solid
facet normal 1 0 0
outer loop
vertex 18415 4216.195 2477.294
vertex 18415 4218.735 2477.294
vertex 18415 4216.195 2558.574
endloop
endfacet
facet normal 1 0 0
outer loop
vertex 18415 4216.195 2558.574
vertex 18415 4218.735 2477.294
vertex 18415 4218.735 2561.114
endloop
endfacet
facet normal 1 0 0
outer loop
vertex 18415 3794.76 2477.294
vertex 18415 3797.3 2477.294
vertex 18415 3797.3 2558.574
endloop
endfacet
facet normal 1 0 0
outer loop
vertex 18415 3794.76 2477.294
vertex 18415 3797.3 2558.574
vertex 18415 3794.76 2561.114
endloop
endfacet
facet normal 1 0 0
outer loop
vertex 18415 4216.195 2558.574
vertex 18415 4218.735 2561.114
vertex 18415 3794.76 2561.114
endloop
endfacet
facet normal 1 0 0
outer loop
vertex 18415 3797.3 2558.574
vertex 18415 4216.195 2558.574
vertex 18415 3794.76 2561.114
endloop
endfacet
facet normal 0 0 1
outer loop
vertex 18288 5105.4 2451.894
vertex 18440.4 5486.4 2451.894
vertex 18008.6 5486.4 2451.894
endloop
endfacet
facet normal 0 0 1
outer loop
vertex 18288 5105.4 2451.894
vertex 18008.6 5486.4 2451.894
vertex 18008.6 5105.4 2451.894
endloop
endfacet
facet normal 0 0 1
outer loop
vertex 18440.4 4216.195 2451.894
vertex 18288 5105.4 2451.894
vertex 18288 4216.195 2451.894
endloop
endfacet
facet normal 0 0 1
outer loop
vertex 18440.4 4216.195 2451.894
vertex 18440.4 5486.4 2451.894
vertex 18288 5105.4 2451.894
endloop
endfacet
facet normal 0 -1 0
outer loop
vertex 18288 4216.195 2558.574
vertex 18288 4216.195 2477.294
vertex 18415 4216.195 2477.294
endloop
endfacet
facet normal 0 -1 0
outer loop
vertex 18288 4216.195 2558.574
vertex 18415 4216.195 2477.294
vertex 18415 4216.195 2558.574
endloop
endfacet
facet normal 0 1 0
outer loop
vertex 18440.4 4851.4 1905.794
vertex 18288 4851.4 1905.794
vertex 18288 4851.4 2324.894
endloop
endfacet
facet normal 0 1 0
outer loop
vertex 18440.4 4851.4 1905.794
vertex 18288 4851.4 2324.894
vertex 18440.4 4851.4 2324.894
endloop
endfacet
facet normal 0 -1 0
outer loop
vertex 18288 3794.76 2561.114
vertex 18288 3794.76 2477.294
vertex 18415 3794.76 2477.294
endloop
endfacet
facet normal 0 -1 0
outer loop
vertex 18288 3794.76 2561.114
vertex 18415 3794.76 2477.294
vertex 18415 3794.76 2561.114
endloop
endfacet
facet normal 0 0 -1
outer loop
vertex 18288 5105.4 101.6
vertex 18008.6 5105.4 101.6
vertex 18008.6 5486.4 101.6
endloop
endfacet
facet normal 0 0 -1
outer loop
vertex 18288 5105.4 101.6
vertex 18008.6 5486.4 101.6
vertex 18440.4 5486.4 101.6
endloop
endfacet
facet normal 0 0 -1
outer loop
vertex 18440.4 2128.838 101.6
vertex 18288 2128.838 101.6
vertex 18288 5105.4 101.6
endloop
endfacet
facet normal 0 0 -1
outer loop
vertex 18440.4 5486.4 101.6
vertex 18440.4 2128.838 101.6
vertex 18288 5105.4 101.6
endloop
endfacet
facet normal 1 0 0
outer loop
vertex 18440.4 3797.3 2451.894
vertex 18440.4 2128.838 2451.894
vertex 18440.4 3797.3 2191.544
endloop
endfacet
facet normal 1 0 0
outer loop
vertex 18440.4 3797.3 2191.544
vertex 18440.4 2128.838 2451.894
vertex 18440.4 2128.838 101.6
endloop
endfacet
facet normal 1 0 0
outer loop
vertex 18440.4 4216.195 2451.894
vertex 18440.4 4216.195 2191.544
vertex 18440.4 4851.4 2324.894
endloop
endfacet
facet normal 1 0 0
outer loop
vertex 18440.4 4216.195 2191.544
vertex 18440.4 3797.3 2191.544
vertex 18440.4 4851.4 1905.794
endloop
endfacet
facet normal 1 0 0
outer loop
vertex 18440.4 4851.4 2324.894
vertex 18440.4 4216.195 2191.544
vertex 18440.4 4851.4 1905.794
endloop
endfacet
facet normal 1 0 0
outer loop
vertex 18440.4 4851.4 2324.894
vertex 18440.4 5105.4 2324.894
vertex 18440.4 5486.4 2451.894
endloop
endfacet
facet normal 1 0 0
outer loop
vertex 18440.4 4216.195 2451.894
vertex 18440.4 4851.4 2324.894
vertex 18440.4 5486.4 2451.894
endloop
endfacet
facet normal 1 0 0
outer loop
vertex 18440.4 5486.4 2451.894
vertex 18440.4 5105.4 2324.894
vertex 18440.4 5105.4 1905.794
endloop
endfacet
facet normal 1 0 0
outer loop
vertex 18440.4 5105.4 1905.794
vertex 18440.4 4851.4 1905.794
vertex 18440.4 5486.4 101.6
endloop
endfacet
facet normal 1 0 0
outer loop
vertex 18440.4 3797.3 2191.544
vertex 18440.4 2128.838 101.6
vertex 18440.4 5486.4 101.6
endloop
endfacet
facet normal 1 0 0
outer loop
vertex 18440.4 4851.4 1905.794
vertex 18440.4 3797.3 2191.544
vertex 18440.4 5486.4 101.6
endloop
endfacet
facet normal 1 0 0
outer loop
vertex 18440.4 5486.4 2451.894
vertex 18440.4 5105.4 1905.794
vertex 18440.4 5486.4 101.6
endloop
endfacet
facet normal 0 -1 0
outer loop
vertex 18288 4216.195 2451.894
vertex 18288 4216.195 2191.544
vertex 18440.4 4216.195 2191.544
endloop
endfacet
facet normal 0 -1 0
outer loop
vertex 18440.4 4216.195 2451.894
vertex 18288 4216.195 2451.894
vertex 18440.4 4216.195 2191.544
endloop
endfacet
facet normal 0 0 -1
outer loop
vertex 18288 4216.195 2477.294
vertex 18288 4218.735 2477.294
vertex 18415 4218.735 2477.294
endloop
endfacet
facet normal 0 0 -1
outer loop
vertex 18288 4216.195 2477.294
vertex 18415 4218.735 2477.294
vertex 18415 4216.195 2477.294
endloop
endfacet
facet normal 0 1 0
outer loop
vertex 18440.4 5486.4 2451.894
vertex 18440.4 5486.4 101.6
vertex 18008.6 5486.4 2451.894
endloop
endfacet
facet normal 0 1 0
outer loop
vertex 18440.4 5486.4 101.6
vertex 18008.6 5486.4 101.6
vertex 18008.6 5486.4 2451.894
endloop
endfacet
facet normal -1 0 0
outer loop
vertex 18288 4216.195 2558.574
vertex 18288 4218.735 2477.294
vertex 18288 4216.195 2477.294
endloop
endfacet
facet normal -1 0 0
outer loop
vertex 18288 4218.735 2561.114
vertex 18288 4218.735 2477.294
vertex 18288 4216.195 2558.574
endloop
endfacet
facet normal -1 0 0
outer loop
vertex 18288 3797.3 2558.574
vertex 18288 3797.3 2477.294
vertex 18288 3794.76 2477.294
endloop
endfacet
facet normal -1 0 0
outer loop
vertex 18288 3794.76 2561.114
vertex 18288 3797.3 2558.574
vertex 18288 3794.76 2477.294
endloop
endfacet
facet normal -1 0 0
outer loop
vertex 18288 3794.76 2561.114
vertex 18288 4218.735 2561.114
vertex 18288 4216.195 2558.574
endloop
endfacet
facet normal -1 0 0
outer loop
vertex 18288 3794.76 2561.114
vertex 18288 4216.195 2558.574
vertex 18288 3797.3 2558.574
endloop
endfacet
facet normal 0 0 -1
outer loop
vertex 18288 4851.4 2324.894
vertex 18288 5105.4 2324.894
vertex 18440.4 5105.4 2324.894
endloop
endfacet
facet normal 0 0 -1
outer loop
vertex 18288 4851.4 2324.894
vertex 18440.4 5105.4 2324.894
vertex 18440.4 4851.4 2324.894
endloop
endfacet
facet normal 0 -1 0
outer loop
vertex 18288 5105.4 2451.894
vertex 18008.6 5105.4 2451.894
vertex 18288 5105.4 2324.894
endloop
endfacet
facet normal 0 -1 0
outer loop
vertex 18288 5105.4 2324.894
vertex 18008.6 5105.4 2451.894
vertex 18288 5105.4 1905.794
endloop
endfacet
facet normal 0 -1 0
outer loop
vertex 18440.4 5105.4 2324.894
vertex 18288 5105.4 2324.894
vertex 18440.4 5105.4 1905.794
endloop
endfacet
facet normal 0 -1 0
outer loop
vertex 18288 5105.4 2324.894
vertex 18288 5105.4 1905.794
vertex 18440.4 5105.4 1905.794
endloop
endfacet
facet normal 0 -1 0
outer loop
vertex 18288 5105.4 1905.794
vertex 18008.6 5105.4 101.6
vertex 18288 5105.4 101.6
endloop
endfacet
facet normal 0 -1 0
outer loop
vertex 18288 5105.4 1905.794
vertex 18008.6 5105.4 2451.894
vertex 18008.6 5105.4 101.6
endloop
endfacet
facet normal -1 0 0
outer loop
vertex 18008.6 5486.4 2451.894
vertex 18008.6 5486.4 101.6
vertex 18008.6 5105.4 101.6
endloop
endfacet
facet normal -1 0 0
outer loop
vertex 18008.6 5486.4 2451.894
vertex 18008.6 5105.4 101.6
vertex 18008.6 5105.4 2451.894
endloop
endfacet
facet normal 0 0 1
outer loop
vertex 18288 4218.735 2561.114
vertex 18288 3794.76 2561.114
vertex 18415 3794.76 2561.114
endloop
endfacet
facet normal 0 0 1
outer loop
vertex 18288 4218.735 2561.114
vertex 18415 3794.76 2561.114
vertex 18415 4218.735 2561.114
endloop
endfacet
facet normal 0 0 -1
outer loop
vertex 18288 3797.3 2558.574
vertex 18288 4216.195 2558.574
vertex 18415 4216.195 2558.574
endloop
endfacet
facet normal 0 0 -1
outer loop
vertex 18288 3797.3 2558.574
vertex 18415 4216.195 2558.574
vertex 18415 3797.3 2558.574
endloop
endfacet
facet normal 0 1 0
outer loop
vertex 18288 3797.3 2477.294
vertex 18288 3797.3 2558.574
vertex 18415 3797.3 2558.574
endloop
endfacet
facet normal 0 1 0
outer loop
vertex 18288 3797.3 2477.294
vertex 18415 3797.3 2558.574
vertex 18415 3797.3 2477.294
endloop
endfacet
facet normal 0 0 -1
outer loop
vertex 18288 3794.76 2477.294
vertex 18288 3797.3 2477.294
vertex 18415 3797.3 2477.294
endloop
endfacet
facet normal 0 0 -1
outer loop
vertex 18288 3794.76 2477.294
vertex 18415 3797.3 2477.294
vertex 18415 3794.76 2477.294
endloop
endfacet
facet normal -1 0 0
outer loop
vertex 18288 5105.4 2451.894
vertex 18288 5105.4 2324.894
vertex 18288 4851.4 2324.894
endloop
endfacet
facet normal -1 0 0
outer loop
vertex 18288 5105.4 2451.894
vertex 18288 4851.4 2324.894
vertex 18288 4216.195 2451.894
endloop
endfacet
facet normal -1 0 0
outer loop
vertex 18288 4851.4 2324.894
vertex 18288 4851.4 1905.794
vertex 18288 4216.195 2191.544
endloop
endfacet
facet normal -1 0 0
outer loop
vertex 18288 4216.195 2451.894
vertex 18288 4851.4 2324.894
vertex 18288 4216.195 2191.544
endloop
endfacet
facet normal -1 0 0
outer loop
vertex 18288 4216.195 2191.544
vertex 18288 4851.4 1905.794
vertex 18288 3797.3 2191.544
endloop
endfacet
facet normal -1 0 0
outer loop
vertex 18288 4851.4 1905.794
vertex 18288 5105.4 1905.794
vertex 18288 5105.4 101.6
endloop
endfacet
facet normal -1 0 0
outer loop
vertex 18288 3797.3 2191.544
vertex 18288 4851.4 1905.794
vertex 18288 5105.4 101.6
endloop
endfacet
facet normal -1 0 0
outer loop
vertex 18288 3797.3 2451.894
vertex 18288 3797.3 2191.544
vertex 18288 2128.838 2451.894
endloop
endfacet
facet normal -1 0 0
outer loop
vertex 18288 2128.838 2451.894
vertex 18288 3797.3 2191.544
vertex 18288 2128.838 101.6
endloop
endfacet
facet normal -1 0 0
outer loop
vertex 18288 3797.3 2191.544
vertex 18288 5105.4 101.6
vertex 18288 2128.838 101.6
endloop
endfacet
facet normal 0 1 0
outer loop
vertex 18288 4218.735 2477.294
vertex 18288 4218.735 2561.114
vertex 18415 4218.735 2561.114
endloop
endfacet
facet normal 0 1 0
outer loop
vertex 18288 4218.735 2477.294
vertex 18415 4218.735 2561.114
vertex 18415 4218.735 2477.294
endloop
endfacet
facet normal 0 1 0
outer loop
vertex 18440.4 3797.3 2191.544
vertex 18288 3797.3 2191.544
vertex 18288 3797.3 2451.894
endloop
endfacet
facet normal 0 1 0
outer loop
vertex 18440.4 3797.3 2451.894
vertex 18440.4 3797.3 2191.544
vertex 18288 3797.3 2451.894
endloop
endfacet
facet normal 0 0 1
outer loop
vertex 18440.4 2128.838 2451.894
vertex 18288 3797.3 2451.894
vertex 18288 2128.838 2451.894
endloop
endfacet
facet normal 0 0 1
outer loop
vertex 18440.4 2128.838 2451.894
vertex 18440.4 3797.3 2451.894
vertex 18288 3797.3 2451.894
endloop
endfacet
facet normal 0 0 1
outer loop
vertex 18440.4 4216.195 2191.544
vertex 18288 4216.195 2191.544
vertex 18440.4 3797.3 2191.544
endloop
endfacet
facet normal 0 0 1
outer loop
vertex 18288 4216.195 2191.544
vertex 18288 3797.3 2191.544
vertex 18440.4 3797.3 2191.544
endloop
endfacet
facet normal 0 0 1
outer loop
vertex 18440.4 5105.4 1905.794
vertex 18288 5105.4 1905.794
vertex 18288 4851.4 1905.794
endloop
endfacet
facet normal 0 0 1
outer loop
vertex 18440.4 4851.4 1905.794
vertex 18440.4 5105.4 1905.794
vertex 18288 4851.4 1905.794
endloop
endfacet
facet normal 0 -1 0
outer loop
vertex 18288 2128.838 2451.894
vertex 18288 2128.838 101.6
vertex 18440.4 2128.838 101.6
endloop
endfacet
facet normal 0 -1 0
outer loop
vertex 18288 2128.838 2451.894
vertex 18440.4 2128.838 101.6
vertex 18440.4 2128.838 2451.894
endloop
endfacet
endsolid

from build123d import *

# Parameters (mm, degrees)
F0_W      = 18288
F0_H      = 5486.4
F1_DEPTH  = 101.6
F2_W      = 4953
F2_H      = 152.4
F2_W_2    = 152.4
F2_H_2    = 3357.5625
F3_DEPTH  = 2426.49375
F4_DEPTH  = 152.4
F5_DEPTH  = 152.4
F6_W      = 4953
F6_H      = 152.4
F7_DEPTH  = 2350.29375
F8_DEPTH  = 76.2
F9_W      = 381
F9_H      = 279.4
F10_DEPTH = 2350.29375
F11_DEPTH = 101.6
F12_DEPTH = 101.6
F13_DEPTH = 275.43252
F14_DEPTH = 275.43252
F15_DEPTH = 25.4
F16_W     = 762
F16_H     = 254
F17_DEPTH = 2128.8385
F18_DEPTH = 190.5
F19_DEPTH = 63.5
F20_W     = 254
F20_H     = 304.8
F21_DEPTH = 152.401
F22_W     = 281.7354995728
F22_H     = 304.8
F23_DEPTH = 152.401
F24_DEPTH = 304.8
F25_DEPTH = 304.8
F26_DEPTH = 25.4
F27_DEPTH = 25.4
F28_DEPTH = 12.7
F29_DEPTH = 12.7
F30_W     = 127
F30_H     = 2350.29375
F31_DEPTH = 12907.16748
F32_W     = 1574.8
F32_H     = 2133.6
F33_DEPTH = 3230.5635
F34_DEPTH = 1320.8
F35_DEPTH = 1320.8
F36_DEPTH = 120.65
F37_DEPTH = 76.201
F38_DEPTH = 190.5
F39_DEPTH = 190.5
F40_DEPTH = 76.2
F41_DEPTH = 406.4
F42_DEPTH = 406.4
F43_DEPTH = 76.2
F44_DEPTH = 60.96
F45_DEPTH = 25.4
F46_DEPTH = 63.5
F47_DEPTH = 101.6
F48_DEPTH = 127
F49_DEPTH = 25.4
F50_DEPTH = 127
F51_DEPTH = 152.4
F52_DEPTH = 127
F53_W     = 418.8954995728
F53_H     = 2.54
F54_DEPTH = 127


with BuildPart() as f1:
    # F0 (on Top) → F1 (new body)
    with BuildSketch(Plane.XY):
        with Locations((9144, 2743.2)):
            Rectangle(F0_W, F0_H)
    extrude(amount=F1_DEPTH)

    # F2 (on face) → F3 (join)
    with BuildSketch(Plane.XY.offset(101.6)):
        with Locations((15811.5, 2052.6375)):
            Rectangle(F2_W, F2_H)
        with Locations((13258.8, 3807.61875)):
            Rectangle(F2_W_2, F2_H_2)
        with Locations((13258.8, 2052.6375)):
            Rectangle(F2_W_2, F2_H)
    extrude(amount=F3_DEPTH)

    # F4 (add): a face of the model
    f4_faces = [f1.faces().sort_by_distance(p)[0] for p in [
        (18288, 60.4084786837, 50.8),
    ]]
    extrude(f4_faces, amount=F4_DEPTH)

    # F5 (add): a face of the model
    f5_faces = [f1.faces().sort_by_distance(p)[0] for p in [
        (15887.7, 5486.4, 82.9871117188),
    ]]
    extrude(f5_faces, amount=F5_DEPTH)

    # F6 (on face) → F7 (join)
    with BuildSketch(Plane.XY.offset(101.6)):
        with Locations((15811.5, 5562.6)):
            Rectangle(F6_W, F6_H)
        Polygon((18288, 2128.8375), (18440.4, 2128.8375), (18440.4, 5638.8), (18288, 5638.8), (18288, 5486.4), align=None)
    extrude(amount=F7_DEPTH)

    # F8 (cut): a face of the model
    f8_faces = [f1.faces().sort_by_distance(p)[0] for p in [
        (13270.9239827069, 3883.81875, 2528.09375),
    ]]
    extrude(f8_faces, amount=-F8_DEPTH, mode=Mode.SUBTRACT)

    # F9 (on face) → F10 (join, through all)
    with BuildSketch(Plane.XY.offset(101.6)):
        with Locations((18097.5, 5346.7)):
            Rectangle(F9_W, F9_H)
    extrude(amount=F10_DEPTH)

    # F11 (add): a face of the model
    f11_faces = [f1.faces().sort_by_distance(p)[0] for p in [
        (18097.5, 5207, 1276.746875),
    ]]
    extrude(f11_faces, amount=F11_DEPTH)

    # F12 (cut): a face of the model
    f12_faces = [f1.faces().sort_by_distance(p)[0] for p in [
        (17907, 5295.9, 1276.746875),
    ]]
    extrude(f12_faces, amount=-F12_DEPTH, mode=Mode.SUBTRACT)

    # F13 (add): a face of the model
    f13_faces = [f1.faces().sort_by_distance(p)[0] for p in [
        (13182.6, 3807.61875, 1276.746875),
    ]]
    extrude(f13_faces, amount=F13_DEPTH)

    # F14 (cut): a face of the model
    f14_faces = [f1.faces().sort_by_distance(p)[0] for p in [
        (13335, 3807.61875, 1276.746875),
    ]]
    extrude(f14_faces, amount=-F14_DEPTH, mode=Mode.SUBTRACT)

    # F15 (cut): a face of the model
    f15_faces = [f1.faces().sort_by_distance(p)[0] for p in [
        (15673.78374, 1976.4375, 1276.746875),
    ]]
    extrude(f15_faces, amount=-F15_DEPTH, mode=Mode.SUBTRACT)

    # F16 (on face) → F17 (cut, through all)
    with BuildSketch(Plane(origin=(0, 2128.8375, 0), x_dir=(-1, 0, 0), z_dir=(0, 1, 0))):
        with Locations((-14812.16748, 2070.89375)):
            Rectangle(F16_W, F16_H)
    extrude(amount=-F17_DEPTH, mode=Mode.SUBTRACT)

    # F18 (cut): a face of the model
    f18_faces = [f1.faces().sort_by_distance(p)[0] for p in [
        (14812.16748, 2065.3375, 2197.89375),
    ]]
    extrude(f18_faces, amount=-F18_DEPTH, mode=Mode.SUBTRACT)

    # F19 (add): a face of the model
    f19_faces = [f1.faces().sort_by_distance(p)[0] for p in [
        (14812.16748, 2065.3375, 1943.89375),
    ]]
    extrude(f19_faces, amount=F19_DEPTH)

    # F20 (on face) → F21 (cut, through all)
    with BuildSketch(Plane(origin=(18288, 0, 0), x_dir=(0, -1, 0), z_dir=(-1, 0, 0))):
        with Locations((-4978.4, 2223.29375)):
            Rectangle(F20_W, F20_H)
    extrude(amount=-F21_DEPTH, mode=Mode.SUBTRACT)

    # F22 (on face) → F23 (cut, through all)
    with BuildSketch(Plane(origin=(18288, 0, 0), x_dir=(0, -1, 0), z_dir=(-1, 0, 0))):
        with Locations((-3747.6677497864, 2223.29375)):
            Rectangle(F22_W, F22_H)
    extrude(amount=-F23_DEPTH, mode=Mode.SUBTRACT)

    # F24 (cut): a face of the model
    f24_faces = [f1.faces().sort_by_distance(p)[0] for p in [
        (18364.2, 3888.5354995728, 2223.29375),
    ]]
    extrude(f24_faces, amount=-F24_DEPTH, mode=Mode.SUBTRACT)

    # F25 (add): a face of the model
    f25_faces = [f1.faces().sort_by_distance(p)[0] for p in [
        (18364.2, 3606.8, 2223.29375),
    ]]
    extrude(f25_faces, amount=F25_DEPTH)

    # F26 (add): a face of the model
    f26_faces = [f1.faces().sort_by_distance(p)[0] for p in [
        (18364.2, 4193.3354995728, 2223.29375),
    ]]
    extrude(f26_faces, amount=F26_DEPTH)

    # F27 (cut): a face of the model
    f27_faces = [f1.faces().sort_by_distance(p)[0] for p in [
        (18364.2, 3911.6, 2223.29375),
    ]]
    extrude(f27_faces, amount=-F27_DEPTH, mode=Mode.SUBTRACT)

    # F28 (cut): a face of the model
    f28_faces = [f1.faces().sort_by_distance(p)[0] for p in [
        (18364.2, 3886.2, 2223.29375),
    ]]
    extrude(f28_faces, amount=-F28_DEPTH, mode=Mode.SUBTRACT)

    # F29 (add): a face of the model
    f29_faces = [f1.faces().sort_by_distance(p)[0] for p in [
        (18364.2, 4167.9354995728, 2223.29375),
    ]]
    extrude(f29_faces, amount=F29_DEPTH)

    # F30 (on face) → F31 (join, through all)
    with BuildSketch(Plane(origin=(12907.16748, 0, 0), x_dir=(0, -1, 0), z_dir=(-1, 0, 0))):
        with Locations((-2471.7375, 1276.746875)):
            Rectangle(F30_W, F30_H)
    extrude(amount=F31_DEPTH)

    # F32 (on face) → F33 (cut, through all)
    with BuildSketch(Plane.XZ.offset(-2408.2375)):
        with Locations((12018.16748, 1168.4)):
            Rectangle(F32_W, F32_H)
    extrude(amount=-F33_DEPTH, mode=Mode.SUBTRACT)

    # F34 (cut): a face of the model
    f34_faces = [f1.faces().sort_by_distance(p)[0] for p in [
        (11230.76748, 2471.7375, 1168.4),
    ]]
    extrude(f34_faces, amount=-F34_DEPTH, mode=Mode.SUBTRACT)

    # F35 (add): a face of the model
    f35_faces = [f1.faces().sort_by_distance(p)[0] for p in [
        (12805.56748, 2471.7375, 1168.4),
    ]]
    extrude(f35_faces, amount=F35_DEPTH)

    # F36 (add): a face of the model
    f36_faces = [f1.faces().sort_by_distance(p)[0] for p in [
        (18364.2, 4014.3677497864, 2070.89375),
    ]]
    extrude(f36_faces, amount=F36_DEPTH)

    # F37 (cut, through all): a face of the model
    f37_faces = [f1.faces().sort_by_distance(p)[0] for p in [
        (18364.2, 4014.3677497864, 2375.69375),
    ]]
    extrude(f37_faces, amount=-F37_DEPTH, mode=Mode.SUBTRACT)

    # F38 (cut): a face of the model
    f38_faces = [f1.faces().sort_by_distance(p)[0] for p in [
        (18364.2, 4978.4, 2070.89375),
    ]]
    extrude(f38_faces, amount=-F38_DEPTH, mode=Mode.SUBTRACT)

    # F39 (add): a face of the model
    f39_faces = [f1.faces().sort_by_distance(p)[0] for p in [
        (18364.2, 4978.4, 2375.69375),
    ]]
    extrude(f39_faces, amount=F39_DEPTH)

    # F40 (cut): a face of the model
    f40_faces = [f1.faces().sort_by_distance(p)[0] for p in [
        (18364.2, 4978.4, 2185.19375),
    ]]
    extrude(f40_faces, amount=-F40_DEPTH, mode=Mode.SUBTRACT)

    # F41 (cut): a face of the model
    f41_faces = [f1.faces().sort_by_distance(p)[0] for p in [
        (15193.16748, 2065.3375, 2197.89375),
    ]]
    extrude(f41_faces, amount=-F41_DEPTH, mode=Mode.SUBTRACT)

    # F42 (add): a face of the model
    f42_faces = [f1.faces().sort_by_distance(p)[0] for p in [
        (14431.16748, 2065.3375, 2197.89375),
    ]]
    extrude(f42_faces, amount=F42_DEPTH)

    # F43 (cut): a face of the model
    f43_faces = [f1.faces().sort_by_distance(p)[0] for p in [
        (18364.2, 3873.5, 2321.71875),
    ]]
    extrude(f43_faces, amount=-F43_DEPTH, mode=Mode.SUBTRACT)

    # F44 (cut): a face of the model
    f44_faces = [f1.faces().sort_by_distance(p)[0] for p in [
        (18364.2, 4155.2354995728, 2321.71875),
    ]]
    extrude(f44_faces, amount=-F44_DEPTH, mode=Mode.SUBTRACT)

    # F45 (add): a face of the model
    f45_faces = [f1.faces().sort_by_distance(p)[0] for p in [
        (18364.2, 4978.4, 1880.39375),
    ]]
    extrude(f45_faces, amount=F45_DEPTH)

    # F46 (cut): a face of the model
    f46_faces = [f1.faces().sort_by_distance(p)[0] for p in [
        (18364.2, 4978.4, 2261.39375),
    ]]
    extrude(f46_faces, amount=-F46_DEPTH, mode=Mode.SUBTRACT)

    # F47 (cut, through all): a face of the model
    f47_faces = [f1.faces().sort_by_distance(p)[0] for p in [
        (9220.2, 2819.4, 0),
    ]]
    extrude(f47_faces, amount=-F47_DEPTH, mode=Mode.SUBTRACT)

    # F48 (cut, through all): faces of the model
    f48_faces = [f1.faces().sort_by_distance(p)[0] for p in [
        (15684.1781980177, 2001.8375, 1255.7133062071),
        (15684.7988226442, 2128.8375, 1254.457449408),
    ]]
    extrude(f48_faces, amount=-F48_DEPTH, mode=Mode.SUBTRACT)

    # F49 (cut): faces of the model
    f49_faces = [f1.faces().sort_by_distance(p)[0] for p in [
        (15673.78374, 5638.8, 1276.746875),
        (15534.08374, 5486.4, 1276.746875),
    ]]
    extrude(f49_faces, amount=-F49_DEPTH, dir=(0, 1, 0), mode=Mode.SUBTRACT)

    # F50 (cut, through all): a face of the model
    f50_faces = [f1.faces().sort_by_distance(p)[0] for p in [
        (15673.78374, 5613.4, 1276.746875),
    ]]
    extrude(f50_faces, amount=-F50_DEPTH, mode=Mode.SUBTRACT)

    # F51 (cut, through all): a face of the model
    f51_faces = [f1.faces().sort_by_distance(p)[0] for p in [
        (13059.56748, 3807.61875, 1276.746875),
    ]]
    extrude(f51_faces, amount=-F51_DEPTH, mode=Mode.SUBTRACT)

    # F52 (cut, through all): a face of the model
    f52_faces = [f1.faces().sort_by_distance(p)[0] for p in [
        (5924.9926145215, 2408.2375, 1290.2421895841),
    ]]
    extrude(f52_faces, amount=-F52_DEPTH, mode=Mode.SUBTRACT)


with BuildPart() as f54:
    # F53 (on face) → F54 (new body)
    with BuildSketch(Plane(origin=(18288, 0, 0), x_dir=(0, -1, 0), z_dir=(-1, 0, 0))):
        with Locations((-4006.7477497864, 2559.84375)):
            Rectangle(F53_W, F53_H)
        Polygon((-3797.3, 2558.57375), (-3797.3, 2477.29375), (-3794.76, 2477.29375), (-3794.76, 2561.11375), (-3797.3, 2561.11375), align=None)
        Polygon((-4216.1954995728, 2477.29375), (-4216.1954995728, 2558.57375), (-4216.1954995728, 2561.11375), (-4218.7354995728, 2561.11375), (-4218.7354995728, 2477.29375), align=None)
    extrude(amount=-F54_DEPTH)


solid = Compound([f1.part, f54.part])
